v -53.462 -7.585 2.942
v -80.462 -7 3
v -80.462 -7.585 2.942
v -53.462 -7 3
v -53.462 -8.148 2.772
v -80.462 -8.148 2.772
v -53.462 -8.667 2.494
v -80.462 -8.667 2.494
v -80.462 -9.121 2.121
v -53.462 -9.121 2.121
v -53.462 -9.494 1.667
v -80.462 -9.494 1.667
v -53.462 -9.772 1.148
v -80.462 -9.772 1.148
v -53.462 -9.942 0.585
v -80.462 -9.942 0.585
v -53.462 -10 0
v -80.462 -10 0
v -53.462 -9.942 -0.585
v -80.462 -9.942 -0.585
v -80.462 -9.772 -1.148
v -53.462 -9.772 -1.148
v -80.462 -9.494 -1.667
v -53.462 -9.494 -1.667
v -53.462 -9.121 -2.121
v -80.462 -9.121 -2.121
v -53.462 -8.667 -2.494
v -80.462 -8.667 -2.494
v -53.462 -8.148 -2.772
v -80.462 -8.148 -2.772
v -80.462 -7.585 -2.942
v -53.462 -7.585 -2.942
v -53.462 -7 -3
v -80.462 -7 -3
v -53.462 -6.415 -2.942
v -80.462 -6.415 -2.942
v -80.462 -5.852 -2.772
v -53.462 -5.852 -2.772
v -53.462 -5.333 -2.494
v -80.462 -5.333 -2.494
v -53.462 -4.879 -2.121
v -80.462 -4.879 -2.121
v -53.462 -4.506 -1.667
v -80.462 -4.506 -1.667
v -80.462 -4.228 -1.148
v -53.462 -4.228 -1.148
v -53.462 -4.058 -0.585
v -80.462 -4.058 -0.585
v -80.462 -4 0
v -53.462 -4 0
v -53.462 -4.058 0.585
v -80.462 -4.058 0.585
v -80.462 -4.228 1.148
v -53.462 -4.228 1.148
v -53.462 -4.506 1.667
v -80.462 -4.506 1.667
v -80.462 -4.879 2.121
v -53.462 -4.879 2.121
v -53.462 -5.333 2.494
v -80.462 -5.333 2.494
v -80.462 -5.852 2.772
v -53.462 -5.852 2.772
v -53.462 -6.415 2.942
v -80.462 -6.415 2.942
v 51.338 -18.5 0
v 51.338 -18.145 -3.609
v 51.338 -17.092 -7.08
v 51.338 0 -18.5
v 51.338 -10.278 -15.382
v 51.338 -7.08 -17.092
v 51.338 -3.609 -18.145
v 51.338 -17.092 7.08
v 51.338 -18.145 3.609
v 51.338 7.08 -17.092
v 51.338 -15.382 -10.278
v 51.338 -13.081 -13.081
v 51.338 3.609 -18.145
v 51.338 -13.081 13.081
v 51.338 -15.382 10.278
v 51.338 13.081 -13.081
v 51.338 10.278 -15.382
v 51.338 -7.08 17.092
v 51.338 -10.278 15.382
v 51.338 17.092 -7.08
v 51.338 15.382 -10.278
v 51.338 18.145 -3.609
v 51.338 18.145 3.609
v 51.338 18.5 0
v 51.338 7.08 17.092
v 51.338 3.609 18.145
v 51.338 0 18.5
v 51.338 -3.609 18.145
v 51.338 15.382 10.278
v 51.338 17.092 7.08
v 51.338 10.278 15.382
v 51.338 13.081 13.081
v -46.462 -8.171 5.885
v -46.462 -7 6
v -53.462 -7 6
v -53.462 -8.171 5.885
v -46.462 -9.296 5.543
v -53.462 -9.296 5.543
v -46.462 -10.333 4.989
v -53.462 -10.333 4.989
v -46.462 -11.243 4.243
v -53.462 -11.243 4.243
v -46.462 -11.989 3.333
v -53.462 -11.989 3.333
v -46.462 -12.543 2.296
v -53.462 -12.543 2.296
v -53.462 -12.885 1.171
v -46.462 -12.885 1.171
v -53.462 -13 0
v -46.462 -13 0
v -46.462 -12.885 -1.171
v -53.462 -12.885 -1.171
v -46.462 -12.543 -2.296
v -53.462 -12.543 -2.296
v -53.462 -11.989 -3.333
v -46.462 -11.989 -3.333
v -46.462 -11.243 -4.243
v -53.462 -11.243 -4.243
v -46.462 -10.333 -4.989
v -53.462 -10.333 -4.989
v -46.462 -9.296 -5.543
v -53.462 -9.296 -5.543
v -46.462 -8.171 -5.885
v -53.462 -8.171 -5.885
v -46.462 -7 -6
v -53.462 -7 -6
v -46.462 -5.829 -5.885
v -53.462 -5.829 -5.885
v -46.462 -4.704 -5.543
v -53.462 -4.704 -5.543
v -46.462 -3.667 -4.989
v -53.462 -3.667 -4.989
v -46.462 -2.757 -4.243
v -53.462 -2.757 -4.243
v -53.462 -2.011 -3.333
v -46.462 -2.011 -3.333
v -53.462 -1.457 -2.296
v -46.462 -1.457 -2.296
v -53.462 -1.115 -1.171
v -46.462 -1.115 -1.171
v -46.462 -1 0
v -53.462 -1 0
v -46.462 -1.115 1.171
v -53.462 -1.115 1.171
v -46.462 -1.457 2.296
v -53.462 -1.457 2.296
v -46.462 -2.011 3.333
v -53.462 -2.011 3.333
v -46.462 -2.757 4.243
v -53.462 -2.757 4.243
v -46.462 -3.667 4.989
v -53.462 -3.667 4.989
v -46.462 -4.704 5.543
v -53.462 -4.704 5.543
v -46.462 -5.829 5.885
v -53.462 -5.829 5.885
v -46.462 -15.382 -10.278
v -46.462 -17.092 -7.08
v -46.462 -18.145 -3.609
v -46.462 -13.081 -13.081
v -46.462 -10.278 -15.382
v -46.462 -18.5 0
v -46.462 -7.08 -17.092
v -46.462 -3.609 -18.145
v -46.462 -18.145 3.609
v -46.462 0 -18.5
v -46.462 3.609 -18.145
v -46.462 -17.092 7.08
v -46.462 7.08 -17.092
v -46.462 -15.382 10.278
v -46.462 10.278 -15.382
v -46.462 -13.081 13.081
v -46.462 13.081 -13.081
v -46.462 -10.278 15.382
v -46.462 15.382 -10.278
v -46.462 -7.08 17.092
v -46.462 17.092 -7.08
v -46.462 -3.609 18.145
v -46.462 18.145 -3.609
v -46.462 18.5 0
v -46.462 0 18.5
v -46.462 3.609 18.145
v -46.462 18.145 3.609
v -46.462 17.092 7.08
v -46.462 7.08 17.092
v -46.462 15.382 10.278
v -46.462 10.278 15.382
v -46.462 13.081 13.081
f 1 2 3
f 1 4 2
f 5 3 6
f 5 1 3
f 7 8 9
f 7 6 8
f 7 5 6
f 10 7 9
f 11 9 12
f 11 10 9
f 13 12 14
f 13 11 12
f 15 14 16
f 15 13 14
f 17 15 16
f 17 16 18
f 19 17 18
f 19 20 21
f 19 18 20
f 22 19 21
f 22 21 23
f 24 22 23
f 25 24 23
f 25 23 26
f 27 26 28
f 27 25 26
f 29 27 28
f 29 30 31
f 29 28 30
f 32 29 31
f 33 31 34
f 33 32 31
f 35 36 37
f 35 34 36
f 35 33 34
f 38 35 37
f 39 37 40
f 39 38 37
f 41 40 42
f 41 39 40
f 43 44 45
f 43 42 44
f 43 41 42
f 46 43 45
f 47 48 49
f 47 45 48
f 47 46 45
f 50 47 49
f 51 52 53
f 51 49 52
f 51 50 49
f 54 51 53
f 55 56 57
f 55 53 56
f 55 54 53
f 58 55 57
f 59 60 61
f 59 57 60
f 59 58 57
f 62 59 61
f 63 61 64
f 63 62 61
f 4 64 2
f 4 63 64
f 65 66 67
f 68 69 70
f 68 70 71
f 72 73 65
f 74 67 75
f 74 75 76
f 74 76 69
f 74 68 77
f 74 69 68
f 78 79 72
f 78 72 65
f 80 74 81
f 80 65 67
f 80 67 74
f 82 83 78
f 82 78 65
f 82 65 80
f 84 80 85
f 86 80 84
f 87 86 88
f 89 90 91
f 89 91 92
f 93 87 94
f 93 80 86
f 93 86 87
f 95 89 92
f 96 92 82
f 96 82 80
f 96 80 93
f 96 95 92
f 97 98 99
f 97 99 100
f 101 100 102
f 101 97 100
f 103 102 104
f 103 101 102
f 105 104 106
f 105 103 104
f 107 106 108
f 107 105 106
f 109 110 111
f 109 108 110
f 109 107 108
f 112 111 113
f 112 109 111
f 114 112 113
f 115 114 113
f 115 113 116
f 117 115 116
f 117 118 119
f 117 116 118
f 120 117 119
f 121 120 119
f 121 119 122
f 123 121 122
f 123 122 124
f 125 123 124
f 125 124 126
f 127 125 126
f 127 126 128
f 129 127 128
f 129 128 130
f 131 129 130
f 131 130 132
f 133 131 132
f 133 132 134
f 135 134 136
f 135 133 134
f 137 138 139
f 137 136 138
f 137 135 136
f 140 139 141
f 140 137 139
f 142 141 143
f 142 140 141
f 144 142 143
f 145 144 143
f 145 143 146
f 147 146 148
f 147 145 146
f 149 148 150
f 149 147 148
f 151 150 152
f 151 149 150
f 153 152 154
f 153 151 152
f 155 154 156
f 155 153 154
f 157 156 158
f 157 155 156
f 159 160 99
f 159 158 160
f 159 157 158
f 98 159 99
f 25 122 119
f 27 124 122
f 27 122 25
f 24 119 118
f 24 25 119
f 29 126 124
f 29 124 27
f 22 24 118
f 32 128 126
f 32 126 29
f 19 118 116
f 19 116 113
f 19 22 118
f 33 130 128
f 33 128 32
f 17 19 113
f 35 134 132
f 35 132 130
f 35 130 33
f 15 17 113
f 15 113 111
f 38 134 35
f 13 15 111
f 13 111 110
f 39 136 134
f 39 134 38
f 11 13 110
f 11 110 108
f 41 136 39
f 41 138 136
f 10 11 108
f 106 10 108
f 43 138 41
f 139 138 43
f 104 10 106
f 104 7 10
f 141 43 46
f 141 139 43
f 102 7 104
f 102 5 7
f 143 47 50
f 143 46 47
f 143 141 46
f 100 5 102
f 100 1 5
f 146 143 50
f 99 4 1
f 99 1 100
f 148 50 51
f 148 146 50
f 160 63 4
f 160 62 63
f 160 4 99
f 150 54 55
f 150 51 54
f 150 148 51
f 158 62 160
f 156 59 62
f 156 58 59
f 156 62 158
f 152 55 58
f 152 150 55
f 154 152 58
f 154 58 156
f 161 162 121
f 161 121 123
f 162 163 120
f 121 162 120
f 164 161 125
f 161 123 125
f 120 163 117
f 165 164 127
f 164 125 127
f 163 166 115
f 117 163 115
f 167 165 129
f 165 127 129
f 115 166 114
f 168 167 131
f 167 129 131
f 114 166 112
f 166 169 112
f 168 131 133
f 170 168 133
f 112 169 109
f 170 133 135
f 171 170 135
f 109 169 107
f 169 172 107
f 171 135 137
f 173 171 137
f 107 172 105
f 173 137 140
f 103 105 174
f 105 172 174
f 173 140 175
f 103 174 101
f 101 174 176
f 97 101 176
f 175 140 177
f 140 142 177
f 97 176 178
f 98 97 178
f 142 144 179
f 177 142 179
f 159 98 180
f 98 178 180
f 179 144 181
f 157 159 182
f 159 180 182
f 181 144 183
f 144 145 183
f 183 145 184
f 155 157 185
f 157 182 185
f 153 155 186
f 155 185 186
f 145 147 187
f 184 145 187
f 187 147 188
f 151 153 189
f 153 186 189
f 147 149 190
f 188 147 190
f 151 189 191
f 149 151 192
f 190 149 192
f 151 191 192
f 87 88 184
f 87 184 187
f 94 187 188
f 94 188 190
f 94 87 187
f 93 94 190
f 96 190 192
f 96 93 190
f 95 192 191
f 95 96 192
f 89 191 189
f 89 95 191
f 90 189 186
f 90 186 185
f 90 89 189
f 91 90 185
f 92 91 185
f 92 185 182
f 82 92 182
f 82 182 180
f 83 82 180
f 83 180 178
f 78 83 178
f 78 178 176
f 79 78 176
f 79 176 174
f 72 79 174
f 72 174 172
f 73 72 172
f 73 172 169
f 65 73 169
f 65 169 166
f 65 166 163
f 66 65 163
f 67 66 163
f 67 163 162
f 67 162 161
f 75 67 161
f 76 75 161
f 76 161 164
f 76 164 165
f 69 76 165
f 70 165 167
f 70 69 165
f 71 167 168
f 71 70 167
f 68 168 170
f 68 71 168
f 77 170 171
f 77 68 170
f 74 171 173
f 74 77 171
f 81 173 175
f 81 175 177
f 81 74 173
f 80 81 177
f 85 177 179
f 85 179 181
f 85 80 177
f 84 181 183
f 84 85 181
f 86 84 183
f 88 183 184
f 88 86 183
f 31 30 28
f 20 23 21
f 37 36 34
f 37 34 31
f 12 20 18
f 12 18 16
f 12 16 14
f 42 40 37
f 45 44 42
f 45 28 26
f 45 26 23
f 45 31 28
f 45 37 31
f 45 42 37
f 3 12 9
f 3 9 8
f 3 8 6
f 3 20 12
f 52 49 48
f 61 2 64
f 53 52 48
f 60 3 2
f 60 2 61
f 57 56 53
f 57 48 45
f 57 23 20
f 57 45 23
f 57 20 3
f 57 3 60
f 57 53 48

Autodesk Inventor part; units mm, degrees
ref_plane "YZ Plane" through (0, 0, 0) normal (1, 0, 0) x (0, 1, 0)
ref_plane "XZ Plane" through (0, 0, 0) normal (0, 1, 0) x (-1, 0, 0)
ref_plane "XY Plane" through (0, 0, 0) normal (0, 0, 1) x (1, 0, 0)
sketch "Sketch1" plane through (0, 0, 0) normal (0, 0, 1) x (1, 0, 0)
  line L0 (-46.4617, 18.5) -> (51.3383, 18.5)
  line L1 (51.3383, 18.5) -> (51.3383, 0)
  line L2 (-46.4617, 18.5) -> (-46.4617, 0)
  line L3 (-46.4617, 0) -> (51.3383, 0)
  point P0 (0, 0)
  dimension "d30" = 97.8
revolve "Revolution1" add sketch "Sketch1" angle 360 about axis through (-46.4617, 0, 0) along (1, 0, 0)
sketch "Sketch4" plane through (-46.4617, 0, 0) normal (-1, 0, 0) x (0, 0, 1)
  circle A0 centre (0, -7) radius 6
  point P0 (0, 0)
  dimension "d31" = 7
  dimension "d32" = 12
extrude "Extrusion3" add sketch "Sketch4" along normal blind 7
sketch "Sketch5" plane through (-53.4617, -7, 0) normal (-1, 0, 0) x (0, 0, 1)
  circle A0 centre (0, 0) radius 3
  point P0 (0, 7)
  dimension "d35" = 6
extrude "Extrusion4" add sketch "Sketch5" along normal blind 27
properties part number "Moteur"
